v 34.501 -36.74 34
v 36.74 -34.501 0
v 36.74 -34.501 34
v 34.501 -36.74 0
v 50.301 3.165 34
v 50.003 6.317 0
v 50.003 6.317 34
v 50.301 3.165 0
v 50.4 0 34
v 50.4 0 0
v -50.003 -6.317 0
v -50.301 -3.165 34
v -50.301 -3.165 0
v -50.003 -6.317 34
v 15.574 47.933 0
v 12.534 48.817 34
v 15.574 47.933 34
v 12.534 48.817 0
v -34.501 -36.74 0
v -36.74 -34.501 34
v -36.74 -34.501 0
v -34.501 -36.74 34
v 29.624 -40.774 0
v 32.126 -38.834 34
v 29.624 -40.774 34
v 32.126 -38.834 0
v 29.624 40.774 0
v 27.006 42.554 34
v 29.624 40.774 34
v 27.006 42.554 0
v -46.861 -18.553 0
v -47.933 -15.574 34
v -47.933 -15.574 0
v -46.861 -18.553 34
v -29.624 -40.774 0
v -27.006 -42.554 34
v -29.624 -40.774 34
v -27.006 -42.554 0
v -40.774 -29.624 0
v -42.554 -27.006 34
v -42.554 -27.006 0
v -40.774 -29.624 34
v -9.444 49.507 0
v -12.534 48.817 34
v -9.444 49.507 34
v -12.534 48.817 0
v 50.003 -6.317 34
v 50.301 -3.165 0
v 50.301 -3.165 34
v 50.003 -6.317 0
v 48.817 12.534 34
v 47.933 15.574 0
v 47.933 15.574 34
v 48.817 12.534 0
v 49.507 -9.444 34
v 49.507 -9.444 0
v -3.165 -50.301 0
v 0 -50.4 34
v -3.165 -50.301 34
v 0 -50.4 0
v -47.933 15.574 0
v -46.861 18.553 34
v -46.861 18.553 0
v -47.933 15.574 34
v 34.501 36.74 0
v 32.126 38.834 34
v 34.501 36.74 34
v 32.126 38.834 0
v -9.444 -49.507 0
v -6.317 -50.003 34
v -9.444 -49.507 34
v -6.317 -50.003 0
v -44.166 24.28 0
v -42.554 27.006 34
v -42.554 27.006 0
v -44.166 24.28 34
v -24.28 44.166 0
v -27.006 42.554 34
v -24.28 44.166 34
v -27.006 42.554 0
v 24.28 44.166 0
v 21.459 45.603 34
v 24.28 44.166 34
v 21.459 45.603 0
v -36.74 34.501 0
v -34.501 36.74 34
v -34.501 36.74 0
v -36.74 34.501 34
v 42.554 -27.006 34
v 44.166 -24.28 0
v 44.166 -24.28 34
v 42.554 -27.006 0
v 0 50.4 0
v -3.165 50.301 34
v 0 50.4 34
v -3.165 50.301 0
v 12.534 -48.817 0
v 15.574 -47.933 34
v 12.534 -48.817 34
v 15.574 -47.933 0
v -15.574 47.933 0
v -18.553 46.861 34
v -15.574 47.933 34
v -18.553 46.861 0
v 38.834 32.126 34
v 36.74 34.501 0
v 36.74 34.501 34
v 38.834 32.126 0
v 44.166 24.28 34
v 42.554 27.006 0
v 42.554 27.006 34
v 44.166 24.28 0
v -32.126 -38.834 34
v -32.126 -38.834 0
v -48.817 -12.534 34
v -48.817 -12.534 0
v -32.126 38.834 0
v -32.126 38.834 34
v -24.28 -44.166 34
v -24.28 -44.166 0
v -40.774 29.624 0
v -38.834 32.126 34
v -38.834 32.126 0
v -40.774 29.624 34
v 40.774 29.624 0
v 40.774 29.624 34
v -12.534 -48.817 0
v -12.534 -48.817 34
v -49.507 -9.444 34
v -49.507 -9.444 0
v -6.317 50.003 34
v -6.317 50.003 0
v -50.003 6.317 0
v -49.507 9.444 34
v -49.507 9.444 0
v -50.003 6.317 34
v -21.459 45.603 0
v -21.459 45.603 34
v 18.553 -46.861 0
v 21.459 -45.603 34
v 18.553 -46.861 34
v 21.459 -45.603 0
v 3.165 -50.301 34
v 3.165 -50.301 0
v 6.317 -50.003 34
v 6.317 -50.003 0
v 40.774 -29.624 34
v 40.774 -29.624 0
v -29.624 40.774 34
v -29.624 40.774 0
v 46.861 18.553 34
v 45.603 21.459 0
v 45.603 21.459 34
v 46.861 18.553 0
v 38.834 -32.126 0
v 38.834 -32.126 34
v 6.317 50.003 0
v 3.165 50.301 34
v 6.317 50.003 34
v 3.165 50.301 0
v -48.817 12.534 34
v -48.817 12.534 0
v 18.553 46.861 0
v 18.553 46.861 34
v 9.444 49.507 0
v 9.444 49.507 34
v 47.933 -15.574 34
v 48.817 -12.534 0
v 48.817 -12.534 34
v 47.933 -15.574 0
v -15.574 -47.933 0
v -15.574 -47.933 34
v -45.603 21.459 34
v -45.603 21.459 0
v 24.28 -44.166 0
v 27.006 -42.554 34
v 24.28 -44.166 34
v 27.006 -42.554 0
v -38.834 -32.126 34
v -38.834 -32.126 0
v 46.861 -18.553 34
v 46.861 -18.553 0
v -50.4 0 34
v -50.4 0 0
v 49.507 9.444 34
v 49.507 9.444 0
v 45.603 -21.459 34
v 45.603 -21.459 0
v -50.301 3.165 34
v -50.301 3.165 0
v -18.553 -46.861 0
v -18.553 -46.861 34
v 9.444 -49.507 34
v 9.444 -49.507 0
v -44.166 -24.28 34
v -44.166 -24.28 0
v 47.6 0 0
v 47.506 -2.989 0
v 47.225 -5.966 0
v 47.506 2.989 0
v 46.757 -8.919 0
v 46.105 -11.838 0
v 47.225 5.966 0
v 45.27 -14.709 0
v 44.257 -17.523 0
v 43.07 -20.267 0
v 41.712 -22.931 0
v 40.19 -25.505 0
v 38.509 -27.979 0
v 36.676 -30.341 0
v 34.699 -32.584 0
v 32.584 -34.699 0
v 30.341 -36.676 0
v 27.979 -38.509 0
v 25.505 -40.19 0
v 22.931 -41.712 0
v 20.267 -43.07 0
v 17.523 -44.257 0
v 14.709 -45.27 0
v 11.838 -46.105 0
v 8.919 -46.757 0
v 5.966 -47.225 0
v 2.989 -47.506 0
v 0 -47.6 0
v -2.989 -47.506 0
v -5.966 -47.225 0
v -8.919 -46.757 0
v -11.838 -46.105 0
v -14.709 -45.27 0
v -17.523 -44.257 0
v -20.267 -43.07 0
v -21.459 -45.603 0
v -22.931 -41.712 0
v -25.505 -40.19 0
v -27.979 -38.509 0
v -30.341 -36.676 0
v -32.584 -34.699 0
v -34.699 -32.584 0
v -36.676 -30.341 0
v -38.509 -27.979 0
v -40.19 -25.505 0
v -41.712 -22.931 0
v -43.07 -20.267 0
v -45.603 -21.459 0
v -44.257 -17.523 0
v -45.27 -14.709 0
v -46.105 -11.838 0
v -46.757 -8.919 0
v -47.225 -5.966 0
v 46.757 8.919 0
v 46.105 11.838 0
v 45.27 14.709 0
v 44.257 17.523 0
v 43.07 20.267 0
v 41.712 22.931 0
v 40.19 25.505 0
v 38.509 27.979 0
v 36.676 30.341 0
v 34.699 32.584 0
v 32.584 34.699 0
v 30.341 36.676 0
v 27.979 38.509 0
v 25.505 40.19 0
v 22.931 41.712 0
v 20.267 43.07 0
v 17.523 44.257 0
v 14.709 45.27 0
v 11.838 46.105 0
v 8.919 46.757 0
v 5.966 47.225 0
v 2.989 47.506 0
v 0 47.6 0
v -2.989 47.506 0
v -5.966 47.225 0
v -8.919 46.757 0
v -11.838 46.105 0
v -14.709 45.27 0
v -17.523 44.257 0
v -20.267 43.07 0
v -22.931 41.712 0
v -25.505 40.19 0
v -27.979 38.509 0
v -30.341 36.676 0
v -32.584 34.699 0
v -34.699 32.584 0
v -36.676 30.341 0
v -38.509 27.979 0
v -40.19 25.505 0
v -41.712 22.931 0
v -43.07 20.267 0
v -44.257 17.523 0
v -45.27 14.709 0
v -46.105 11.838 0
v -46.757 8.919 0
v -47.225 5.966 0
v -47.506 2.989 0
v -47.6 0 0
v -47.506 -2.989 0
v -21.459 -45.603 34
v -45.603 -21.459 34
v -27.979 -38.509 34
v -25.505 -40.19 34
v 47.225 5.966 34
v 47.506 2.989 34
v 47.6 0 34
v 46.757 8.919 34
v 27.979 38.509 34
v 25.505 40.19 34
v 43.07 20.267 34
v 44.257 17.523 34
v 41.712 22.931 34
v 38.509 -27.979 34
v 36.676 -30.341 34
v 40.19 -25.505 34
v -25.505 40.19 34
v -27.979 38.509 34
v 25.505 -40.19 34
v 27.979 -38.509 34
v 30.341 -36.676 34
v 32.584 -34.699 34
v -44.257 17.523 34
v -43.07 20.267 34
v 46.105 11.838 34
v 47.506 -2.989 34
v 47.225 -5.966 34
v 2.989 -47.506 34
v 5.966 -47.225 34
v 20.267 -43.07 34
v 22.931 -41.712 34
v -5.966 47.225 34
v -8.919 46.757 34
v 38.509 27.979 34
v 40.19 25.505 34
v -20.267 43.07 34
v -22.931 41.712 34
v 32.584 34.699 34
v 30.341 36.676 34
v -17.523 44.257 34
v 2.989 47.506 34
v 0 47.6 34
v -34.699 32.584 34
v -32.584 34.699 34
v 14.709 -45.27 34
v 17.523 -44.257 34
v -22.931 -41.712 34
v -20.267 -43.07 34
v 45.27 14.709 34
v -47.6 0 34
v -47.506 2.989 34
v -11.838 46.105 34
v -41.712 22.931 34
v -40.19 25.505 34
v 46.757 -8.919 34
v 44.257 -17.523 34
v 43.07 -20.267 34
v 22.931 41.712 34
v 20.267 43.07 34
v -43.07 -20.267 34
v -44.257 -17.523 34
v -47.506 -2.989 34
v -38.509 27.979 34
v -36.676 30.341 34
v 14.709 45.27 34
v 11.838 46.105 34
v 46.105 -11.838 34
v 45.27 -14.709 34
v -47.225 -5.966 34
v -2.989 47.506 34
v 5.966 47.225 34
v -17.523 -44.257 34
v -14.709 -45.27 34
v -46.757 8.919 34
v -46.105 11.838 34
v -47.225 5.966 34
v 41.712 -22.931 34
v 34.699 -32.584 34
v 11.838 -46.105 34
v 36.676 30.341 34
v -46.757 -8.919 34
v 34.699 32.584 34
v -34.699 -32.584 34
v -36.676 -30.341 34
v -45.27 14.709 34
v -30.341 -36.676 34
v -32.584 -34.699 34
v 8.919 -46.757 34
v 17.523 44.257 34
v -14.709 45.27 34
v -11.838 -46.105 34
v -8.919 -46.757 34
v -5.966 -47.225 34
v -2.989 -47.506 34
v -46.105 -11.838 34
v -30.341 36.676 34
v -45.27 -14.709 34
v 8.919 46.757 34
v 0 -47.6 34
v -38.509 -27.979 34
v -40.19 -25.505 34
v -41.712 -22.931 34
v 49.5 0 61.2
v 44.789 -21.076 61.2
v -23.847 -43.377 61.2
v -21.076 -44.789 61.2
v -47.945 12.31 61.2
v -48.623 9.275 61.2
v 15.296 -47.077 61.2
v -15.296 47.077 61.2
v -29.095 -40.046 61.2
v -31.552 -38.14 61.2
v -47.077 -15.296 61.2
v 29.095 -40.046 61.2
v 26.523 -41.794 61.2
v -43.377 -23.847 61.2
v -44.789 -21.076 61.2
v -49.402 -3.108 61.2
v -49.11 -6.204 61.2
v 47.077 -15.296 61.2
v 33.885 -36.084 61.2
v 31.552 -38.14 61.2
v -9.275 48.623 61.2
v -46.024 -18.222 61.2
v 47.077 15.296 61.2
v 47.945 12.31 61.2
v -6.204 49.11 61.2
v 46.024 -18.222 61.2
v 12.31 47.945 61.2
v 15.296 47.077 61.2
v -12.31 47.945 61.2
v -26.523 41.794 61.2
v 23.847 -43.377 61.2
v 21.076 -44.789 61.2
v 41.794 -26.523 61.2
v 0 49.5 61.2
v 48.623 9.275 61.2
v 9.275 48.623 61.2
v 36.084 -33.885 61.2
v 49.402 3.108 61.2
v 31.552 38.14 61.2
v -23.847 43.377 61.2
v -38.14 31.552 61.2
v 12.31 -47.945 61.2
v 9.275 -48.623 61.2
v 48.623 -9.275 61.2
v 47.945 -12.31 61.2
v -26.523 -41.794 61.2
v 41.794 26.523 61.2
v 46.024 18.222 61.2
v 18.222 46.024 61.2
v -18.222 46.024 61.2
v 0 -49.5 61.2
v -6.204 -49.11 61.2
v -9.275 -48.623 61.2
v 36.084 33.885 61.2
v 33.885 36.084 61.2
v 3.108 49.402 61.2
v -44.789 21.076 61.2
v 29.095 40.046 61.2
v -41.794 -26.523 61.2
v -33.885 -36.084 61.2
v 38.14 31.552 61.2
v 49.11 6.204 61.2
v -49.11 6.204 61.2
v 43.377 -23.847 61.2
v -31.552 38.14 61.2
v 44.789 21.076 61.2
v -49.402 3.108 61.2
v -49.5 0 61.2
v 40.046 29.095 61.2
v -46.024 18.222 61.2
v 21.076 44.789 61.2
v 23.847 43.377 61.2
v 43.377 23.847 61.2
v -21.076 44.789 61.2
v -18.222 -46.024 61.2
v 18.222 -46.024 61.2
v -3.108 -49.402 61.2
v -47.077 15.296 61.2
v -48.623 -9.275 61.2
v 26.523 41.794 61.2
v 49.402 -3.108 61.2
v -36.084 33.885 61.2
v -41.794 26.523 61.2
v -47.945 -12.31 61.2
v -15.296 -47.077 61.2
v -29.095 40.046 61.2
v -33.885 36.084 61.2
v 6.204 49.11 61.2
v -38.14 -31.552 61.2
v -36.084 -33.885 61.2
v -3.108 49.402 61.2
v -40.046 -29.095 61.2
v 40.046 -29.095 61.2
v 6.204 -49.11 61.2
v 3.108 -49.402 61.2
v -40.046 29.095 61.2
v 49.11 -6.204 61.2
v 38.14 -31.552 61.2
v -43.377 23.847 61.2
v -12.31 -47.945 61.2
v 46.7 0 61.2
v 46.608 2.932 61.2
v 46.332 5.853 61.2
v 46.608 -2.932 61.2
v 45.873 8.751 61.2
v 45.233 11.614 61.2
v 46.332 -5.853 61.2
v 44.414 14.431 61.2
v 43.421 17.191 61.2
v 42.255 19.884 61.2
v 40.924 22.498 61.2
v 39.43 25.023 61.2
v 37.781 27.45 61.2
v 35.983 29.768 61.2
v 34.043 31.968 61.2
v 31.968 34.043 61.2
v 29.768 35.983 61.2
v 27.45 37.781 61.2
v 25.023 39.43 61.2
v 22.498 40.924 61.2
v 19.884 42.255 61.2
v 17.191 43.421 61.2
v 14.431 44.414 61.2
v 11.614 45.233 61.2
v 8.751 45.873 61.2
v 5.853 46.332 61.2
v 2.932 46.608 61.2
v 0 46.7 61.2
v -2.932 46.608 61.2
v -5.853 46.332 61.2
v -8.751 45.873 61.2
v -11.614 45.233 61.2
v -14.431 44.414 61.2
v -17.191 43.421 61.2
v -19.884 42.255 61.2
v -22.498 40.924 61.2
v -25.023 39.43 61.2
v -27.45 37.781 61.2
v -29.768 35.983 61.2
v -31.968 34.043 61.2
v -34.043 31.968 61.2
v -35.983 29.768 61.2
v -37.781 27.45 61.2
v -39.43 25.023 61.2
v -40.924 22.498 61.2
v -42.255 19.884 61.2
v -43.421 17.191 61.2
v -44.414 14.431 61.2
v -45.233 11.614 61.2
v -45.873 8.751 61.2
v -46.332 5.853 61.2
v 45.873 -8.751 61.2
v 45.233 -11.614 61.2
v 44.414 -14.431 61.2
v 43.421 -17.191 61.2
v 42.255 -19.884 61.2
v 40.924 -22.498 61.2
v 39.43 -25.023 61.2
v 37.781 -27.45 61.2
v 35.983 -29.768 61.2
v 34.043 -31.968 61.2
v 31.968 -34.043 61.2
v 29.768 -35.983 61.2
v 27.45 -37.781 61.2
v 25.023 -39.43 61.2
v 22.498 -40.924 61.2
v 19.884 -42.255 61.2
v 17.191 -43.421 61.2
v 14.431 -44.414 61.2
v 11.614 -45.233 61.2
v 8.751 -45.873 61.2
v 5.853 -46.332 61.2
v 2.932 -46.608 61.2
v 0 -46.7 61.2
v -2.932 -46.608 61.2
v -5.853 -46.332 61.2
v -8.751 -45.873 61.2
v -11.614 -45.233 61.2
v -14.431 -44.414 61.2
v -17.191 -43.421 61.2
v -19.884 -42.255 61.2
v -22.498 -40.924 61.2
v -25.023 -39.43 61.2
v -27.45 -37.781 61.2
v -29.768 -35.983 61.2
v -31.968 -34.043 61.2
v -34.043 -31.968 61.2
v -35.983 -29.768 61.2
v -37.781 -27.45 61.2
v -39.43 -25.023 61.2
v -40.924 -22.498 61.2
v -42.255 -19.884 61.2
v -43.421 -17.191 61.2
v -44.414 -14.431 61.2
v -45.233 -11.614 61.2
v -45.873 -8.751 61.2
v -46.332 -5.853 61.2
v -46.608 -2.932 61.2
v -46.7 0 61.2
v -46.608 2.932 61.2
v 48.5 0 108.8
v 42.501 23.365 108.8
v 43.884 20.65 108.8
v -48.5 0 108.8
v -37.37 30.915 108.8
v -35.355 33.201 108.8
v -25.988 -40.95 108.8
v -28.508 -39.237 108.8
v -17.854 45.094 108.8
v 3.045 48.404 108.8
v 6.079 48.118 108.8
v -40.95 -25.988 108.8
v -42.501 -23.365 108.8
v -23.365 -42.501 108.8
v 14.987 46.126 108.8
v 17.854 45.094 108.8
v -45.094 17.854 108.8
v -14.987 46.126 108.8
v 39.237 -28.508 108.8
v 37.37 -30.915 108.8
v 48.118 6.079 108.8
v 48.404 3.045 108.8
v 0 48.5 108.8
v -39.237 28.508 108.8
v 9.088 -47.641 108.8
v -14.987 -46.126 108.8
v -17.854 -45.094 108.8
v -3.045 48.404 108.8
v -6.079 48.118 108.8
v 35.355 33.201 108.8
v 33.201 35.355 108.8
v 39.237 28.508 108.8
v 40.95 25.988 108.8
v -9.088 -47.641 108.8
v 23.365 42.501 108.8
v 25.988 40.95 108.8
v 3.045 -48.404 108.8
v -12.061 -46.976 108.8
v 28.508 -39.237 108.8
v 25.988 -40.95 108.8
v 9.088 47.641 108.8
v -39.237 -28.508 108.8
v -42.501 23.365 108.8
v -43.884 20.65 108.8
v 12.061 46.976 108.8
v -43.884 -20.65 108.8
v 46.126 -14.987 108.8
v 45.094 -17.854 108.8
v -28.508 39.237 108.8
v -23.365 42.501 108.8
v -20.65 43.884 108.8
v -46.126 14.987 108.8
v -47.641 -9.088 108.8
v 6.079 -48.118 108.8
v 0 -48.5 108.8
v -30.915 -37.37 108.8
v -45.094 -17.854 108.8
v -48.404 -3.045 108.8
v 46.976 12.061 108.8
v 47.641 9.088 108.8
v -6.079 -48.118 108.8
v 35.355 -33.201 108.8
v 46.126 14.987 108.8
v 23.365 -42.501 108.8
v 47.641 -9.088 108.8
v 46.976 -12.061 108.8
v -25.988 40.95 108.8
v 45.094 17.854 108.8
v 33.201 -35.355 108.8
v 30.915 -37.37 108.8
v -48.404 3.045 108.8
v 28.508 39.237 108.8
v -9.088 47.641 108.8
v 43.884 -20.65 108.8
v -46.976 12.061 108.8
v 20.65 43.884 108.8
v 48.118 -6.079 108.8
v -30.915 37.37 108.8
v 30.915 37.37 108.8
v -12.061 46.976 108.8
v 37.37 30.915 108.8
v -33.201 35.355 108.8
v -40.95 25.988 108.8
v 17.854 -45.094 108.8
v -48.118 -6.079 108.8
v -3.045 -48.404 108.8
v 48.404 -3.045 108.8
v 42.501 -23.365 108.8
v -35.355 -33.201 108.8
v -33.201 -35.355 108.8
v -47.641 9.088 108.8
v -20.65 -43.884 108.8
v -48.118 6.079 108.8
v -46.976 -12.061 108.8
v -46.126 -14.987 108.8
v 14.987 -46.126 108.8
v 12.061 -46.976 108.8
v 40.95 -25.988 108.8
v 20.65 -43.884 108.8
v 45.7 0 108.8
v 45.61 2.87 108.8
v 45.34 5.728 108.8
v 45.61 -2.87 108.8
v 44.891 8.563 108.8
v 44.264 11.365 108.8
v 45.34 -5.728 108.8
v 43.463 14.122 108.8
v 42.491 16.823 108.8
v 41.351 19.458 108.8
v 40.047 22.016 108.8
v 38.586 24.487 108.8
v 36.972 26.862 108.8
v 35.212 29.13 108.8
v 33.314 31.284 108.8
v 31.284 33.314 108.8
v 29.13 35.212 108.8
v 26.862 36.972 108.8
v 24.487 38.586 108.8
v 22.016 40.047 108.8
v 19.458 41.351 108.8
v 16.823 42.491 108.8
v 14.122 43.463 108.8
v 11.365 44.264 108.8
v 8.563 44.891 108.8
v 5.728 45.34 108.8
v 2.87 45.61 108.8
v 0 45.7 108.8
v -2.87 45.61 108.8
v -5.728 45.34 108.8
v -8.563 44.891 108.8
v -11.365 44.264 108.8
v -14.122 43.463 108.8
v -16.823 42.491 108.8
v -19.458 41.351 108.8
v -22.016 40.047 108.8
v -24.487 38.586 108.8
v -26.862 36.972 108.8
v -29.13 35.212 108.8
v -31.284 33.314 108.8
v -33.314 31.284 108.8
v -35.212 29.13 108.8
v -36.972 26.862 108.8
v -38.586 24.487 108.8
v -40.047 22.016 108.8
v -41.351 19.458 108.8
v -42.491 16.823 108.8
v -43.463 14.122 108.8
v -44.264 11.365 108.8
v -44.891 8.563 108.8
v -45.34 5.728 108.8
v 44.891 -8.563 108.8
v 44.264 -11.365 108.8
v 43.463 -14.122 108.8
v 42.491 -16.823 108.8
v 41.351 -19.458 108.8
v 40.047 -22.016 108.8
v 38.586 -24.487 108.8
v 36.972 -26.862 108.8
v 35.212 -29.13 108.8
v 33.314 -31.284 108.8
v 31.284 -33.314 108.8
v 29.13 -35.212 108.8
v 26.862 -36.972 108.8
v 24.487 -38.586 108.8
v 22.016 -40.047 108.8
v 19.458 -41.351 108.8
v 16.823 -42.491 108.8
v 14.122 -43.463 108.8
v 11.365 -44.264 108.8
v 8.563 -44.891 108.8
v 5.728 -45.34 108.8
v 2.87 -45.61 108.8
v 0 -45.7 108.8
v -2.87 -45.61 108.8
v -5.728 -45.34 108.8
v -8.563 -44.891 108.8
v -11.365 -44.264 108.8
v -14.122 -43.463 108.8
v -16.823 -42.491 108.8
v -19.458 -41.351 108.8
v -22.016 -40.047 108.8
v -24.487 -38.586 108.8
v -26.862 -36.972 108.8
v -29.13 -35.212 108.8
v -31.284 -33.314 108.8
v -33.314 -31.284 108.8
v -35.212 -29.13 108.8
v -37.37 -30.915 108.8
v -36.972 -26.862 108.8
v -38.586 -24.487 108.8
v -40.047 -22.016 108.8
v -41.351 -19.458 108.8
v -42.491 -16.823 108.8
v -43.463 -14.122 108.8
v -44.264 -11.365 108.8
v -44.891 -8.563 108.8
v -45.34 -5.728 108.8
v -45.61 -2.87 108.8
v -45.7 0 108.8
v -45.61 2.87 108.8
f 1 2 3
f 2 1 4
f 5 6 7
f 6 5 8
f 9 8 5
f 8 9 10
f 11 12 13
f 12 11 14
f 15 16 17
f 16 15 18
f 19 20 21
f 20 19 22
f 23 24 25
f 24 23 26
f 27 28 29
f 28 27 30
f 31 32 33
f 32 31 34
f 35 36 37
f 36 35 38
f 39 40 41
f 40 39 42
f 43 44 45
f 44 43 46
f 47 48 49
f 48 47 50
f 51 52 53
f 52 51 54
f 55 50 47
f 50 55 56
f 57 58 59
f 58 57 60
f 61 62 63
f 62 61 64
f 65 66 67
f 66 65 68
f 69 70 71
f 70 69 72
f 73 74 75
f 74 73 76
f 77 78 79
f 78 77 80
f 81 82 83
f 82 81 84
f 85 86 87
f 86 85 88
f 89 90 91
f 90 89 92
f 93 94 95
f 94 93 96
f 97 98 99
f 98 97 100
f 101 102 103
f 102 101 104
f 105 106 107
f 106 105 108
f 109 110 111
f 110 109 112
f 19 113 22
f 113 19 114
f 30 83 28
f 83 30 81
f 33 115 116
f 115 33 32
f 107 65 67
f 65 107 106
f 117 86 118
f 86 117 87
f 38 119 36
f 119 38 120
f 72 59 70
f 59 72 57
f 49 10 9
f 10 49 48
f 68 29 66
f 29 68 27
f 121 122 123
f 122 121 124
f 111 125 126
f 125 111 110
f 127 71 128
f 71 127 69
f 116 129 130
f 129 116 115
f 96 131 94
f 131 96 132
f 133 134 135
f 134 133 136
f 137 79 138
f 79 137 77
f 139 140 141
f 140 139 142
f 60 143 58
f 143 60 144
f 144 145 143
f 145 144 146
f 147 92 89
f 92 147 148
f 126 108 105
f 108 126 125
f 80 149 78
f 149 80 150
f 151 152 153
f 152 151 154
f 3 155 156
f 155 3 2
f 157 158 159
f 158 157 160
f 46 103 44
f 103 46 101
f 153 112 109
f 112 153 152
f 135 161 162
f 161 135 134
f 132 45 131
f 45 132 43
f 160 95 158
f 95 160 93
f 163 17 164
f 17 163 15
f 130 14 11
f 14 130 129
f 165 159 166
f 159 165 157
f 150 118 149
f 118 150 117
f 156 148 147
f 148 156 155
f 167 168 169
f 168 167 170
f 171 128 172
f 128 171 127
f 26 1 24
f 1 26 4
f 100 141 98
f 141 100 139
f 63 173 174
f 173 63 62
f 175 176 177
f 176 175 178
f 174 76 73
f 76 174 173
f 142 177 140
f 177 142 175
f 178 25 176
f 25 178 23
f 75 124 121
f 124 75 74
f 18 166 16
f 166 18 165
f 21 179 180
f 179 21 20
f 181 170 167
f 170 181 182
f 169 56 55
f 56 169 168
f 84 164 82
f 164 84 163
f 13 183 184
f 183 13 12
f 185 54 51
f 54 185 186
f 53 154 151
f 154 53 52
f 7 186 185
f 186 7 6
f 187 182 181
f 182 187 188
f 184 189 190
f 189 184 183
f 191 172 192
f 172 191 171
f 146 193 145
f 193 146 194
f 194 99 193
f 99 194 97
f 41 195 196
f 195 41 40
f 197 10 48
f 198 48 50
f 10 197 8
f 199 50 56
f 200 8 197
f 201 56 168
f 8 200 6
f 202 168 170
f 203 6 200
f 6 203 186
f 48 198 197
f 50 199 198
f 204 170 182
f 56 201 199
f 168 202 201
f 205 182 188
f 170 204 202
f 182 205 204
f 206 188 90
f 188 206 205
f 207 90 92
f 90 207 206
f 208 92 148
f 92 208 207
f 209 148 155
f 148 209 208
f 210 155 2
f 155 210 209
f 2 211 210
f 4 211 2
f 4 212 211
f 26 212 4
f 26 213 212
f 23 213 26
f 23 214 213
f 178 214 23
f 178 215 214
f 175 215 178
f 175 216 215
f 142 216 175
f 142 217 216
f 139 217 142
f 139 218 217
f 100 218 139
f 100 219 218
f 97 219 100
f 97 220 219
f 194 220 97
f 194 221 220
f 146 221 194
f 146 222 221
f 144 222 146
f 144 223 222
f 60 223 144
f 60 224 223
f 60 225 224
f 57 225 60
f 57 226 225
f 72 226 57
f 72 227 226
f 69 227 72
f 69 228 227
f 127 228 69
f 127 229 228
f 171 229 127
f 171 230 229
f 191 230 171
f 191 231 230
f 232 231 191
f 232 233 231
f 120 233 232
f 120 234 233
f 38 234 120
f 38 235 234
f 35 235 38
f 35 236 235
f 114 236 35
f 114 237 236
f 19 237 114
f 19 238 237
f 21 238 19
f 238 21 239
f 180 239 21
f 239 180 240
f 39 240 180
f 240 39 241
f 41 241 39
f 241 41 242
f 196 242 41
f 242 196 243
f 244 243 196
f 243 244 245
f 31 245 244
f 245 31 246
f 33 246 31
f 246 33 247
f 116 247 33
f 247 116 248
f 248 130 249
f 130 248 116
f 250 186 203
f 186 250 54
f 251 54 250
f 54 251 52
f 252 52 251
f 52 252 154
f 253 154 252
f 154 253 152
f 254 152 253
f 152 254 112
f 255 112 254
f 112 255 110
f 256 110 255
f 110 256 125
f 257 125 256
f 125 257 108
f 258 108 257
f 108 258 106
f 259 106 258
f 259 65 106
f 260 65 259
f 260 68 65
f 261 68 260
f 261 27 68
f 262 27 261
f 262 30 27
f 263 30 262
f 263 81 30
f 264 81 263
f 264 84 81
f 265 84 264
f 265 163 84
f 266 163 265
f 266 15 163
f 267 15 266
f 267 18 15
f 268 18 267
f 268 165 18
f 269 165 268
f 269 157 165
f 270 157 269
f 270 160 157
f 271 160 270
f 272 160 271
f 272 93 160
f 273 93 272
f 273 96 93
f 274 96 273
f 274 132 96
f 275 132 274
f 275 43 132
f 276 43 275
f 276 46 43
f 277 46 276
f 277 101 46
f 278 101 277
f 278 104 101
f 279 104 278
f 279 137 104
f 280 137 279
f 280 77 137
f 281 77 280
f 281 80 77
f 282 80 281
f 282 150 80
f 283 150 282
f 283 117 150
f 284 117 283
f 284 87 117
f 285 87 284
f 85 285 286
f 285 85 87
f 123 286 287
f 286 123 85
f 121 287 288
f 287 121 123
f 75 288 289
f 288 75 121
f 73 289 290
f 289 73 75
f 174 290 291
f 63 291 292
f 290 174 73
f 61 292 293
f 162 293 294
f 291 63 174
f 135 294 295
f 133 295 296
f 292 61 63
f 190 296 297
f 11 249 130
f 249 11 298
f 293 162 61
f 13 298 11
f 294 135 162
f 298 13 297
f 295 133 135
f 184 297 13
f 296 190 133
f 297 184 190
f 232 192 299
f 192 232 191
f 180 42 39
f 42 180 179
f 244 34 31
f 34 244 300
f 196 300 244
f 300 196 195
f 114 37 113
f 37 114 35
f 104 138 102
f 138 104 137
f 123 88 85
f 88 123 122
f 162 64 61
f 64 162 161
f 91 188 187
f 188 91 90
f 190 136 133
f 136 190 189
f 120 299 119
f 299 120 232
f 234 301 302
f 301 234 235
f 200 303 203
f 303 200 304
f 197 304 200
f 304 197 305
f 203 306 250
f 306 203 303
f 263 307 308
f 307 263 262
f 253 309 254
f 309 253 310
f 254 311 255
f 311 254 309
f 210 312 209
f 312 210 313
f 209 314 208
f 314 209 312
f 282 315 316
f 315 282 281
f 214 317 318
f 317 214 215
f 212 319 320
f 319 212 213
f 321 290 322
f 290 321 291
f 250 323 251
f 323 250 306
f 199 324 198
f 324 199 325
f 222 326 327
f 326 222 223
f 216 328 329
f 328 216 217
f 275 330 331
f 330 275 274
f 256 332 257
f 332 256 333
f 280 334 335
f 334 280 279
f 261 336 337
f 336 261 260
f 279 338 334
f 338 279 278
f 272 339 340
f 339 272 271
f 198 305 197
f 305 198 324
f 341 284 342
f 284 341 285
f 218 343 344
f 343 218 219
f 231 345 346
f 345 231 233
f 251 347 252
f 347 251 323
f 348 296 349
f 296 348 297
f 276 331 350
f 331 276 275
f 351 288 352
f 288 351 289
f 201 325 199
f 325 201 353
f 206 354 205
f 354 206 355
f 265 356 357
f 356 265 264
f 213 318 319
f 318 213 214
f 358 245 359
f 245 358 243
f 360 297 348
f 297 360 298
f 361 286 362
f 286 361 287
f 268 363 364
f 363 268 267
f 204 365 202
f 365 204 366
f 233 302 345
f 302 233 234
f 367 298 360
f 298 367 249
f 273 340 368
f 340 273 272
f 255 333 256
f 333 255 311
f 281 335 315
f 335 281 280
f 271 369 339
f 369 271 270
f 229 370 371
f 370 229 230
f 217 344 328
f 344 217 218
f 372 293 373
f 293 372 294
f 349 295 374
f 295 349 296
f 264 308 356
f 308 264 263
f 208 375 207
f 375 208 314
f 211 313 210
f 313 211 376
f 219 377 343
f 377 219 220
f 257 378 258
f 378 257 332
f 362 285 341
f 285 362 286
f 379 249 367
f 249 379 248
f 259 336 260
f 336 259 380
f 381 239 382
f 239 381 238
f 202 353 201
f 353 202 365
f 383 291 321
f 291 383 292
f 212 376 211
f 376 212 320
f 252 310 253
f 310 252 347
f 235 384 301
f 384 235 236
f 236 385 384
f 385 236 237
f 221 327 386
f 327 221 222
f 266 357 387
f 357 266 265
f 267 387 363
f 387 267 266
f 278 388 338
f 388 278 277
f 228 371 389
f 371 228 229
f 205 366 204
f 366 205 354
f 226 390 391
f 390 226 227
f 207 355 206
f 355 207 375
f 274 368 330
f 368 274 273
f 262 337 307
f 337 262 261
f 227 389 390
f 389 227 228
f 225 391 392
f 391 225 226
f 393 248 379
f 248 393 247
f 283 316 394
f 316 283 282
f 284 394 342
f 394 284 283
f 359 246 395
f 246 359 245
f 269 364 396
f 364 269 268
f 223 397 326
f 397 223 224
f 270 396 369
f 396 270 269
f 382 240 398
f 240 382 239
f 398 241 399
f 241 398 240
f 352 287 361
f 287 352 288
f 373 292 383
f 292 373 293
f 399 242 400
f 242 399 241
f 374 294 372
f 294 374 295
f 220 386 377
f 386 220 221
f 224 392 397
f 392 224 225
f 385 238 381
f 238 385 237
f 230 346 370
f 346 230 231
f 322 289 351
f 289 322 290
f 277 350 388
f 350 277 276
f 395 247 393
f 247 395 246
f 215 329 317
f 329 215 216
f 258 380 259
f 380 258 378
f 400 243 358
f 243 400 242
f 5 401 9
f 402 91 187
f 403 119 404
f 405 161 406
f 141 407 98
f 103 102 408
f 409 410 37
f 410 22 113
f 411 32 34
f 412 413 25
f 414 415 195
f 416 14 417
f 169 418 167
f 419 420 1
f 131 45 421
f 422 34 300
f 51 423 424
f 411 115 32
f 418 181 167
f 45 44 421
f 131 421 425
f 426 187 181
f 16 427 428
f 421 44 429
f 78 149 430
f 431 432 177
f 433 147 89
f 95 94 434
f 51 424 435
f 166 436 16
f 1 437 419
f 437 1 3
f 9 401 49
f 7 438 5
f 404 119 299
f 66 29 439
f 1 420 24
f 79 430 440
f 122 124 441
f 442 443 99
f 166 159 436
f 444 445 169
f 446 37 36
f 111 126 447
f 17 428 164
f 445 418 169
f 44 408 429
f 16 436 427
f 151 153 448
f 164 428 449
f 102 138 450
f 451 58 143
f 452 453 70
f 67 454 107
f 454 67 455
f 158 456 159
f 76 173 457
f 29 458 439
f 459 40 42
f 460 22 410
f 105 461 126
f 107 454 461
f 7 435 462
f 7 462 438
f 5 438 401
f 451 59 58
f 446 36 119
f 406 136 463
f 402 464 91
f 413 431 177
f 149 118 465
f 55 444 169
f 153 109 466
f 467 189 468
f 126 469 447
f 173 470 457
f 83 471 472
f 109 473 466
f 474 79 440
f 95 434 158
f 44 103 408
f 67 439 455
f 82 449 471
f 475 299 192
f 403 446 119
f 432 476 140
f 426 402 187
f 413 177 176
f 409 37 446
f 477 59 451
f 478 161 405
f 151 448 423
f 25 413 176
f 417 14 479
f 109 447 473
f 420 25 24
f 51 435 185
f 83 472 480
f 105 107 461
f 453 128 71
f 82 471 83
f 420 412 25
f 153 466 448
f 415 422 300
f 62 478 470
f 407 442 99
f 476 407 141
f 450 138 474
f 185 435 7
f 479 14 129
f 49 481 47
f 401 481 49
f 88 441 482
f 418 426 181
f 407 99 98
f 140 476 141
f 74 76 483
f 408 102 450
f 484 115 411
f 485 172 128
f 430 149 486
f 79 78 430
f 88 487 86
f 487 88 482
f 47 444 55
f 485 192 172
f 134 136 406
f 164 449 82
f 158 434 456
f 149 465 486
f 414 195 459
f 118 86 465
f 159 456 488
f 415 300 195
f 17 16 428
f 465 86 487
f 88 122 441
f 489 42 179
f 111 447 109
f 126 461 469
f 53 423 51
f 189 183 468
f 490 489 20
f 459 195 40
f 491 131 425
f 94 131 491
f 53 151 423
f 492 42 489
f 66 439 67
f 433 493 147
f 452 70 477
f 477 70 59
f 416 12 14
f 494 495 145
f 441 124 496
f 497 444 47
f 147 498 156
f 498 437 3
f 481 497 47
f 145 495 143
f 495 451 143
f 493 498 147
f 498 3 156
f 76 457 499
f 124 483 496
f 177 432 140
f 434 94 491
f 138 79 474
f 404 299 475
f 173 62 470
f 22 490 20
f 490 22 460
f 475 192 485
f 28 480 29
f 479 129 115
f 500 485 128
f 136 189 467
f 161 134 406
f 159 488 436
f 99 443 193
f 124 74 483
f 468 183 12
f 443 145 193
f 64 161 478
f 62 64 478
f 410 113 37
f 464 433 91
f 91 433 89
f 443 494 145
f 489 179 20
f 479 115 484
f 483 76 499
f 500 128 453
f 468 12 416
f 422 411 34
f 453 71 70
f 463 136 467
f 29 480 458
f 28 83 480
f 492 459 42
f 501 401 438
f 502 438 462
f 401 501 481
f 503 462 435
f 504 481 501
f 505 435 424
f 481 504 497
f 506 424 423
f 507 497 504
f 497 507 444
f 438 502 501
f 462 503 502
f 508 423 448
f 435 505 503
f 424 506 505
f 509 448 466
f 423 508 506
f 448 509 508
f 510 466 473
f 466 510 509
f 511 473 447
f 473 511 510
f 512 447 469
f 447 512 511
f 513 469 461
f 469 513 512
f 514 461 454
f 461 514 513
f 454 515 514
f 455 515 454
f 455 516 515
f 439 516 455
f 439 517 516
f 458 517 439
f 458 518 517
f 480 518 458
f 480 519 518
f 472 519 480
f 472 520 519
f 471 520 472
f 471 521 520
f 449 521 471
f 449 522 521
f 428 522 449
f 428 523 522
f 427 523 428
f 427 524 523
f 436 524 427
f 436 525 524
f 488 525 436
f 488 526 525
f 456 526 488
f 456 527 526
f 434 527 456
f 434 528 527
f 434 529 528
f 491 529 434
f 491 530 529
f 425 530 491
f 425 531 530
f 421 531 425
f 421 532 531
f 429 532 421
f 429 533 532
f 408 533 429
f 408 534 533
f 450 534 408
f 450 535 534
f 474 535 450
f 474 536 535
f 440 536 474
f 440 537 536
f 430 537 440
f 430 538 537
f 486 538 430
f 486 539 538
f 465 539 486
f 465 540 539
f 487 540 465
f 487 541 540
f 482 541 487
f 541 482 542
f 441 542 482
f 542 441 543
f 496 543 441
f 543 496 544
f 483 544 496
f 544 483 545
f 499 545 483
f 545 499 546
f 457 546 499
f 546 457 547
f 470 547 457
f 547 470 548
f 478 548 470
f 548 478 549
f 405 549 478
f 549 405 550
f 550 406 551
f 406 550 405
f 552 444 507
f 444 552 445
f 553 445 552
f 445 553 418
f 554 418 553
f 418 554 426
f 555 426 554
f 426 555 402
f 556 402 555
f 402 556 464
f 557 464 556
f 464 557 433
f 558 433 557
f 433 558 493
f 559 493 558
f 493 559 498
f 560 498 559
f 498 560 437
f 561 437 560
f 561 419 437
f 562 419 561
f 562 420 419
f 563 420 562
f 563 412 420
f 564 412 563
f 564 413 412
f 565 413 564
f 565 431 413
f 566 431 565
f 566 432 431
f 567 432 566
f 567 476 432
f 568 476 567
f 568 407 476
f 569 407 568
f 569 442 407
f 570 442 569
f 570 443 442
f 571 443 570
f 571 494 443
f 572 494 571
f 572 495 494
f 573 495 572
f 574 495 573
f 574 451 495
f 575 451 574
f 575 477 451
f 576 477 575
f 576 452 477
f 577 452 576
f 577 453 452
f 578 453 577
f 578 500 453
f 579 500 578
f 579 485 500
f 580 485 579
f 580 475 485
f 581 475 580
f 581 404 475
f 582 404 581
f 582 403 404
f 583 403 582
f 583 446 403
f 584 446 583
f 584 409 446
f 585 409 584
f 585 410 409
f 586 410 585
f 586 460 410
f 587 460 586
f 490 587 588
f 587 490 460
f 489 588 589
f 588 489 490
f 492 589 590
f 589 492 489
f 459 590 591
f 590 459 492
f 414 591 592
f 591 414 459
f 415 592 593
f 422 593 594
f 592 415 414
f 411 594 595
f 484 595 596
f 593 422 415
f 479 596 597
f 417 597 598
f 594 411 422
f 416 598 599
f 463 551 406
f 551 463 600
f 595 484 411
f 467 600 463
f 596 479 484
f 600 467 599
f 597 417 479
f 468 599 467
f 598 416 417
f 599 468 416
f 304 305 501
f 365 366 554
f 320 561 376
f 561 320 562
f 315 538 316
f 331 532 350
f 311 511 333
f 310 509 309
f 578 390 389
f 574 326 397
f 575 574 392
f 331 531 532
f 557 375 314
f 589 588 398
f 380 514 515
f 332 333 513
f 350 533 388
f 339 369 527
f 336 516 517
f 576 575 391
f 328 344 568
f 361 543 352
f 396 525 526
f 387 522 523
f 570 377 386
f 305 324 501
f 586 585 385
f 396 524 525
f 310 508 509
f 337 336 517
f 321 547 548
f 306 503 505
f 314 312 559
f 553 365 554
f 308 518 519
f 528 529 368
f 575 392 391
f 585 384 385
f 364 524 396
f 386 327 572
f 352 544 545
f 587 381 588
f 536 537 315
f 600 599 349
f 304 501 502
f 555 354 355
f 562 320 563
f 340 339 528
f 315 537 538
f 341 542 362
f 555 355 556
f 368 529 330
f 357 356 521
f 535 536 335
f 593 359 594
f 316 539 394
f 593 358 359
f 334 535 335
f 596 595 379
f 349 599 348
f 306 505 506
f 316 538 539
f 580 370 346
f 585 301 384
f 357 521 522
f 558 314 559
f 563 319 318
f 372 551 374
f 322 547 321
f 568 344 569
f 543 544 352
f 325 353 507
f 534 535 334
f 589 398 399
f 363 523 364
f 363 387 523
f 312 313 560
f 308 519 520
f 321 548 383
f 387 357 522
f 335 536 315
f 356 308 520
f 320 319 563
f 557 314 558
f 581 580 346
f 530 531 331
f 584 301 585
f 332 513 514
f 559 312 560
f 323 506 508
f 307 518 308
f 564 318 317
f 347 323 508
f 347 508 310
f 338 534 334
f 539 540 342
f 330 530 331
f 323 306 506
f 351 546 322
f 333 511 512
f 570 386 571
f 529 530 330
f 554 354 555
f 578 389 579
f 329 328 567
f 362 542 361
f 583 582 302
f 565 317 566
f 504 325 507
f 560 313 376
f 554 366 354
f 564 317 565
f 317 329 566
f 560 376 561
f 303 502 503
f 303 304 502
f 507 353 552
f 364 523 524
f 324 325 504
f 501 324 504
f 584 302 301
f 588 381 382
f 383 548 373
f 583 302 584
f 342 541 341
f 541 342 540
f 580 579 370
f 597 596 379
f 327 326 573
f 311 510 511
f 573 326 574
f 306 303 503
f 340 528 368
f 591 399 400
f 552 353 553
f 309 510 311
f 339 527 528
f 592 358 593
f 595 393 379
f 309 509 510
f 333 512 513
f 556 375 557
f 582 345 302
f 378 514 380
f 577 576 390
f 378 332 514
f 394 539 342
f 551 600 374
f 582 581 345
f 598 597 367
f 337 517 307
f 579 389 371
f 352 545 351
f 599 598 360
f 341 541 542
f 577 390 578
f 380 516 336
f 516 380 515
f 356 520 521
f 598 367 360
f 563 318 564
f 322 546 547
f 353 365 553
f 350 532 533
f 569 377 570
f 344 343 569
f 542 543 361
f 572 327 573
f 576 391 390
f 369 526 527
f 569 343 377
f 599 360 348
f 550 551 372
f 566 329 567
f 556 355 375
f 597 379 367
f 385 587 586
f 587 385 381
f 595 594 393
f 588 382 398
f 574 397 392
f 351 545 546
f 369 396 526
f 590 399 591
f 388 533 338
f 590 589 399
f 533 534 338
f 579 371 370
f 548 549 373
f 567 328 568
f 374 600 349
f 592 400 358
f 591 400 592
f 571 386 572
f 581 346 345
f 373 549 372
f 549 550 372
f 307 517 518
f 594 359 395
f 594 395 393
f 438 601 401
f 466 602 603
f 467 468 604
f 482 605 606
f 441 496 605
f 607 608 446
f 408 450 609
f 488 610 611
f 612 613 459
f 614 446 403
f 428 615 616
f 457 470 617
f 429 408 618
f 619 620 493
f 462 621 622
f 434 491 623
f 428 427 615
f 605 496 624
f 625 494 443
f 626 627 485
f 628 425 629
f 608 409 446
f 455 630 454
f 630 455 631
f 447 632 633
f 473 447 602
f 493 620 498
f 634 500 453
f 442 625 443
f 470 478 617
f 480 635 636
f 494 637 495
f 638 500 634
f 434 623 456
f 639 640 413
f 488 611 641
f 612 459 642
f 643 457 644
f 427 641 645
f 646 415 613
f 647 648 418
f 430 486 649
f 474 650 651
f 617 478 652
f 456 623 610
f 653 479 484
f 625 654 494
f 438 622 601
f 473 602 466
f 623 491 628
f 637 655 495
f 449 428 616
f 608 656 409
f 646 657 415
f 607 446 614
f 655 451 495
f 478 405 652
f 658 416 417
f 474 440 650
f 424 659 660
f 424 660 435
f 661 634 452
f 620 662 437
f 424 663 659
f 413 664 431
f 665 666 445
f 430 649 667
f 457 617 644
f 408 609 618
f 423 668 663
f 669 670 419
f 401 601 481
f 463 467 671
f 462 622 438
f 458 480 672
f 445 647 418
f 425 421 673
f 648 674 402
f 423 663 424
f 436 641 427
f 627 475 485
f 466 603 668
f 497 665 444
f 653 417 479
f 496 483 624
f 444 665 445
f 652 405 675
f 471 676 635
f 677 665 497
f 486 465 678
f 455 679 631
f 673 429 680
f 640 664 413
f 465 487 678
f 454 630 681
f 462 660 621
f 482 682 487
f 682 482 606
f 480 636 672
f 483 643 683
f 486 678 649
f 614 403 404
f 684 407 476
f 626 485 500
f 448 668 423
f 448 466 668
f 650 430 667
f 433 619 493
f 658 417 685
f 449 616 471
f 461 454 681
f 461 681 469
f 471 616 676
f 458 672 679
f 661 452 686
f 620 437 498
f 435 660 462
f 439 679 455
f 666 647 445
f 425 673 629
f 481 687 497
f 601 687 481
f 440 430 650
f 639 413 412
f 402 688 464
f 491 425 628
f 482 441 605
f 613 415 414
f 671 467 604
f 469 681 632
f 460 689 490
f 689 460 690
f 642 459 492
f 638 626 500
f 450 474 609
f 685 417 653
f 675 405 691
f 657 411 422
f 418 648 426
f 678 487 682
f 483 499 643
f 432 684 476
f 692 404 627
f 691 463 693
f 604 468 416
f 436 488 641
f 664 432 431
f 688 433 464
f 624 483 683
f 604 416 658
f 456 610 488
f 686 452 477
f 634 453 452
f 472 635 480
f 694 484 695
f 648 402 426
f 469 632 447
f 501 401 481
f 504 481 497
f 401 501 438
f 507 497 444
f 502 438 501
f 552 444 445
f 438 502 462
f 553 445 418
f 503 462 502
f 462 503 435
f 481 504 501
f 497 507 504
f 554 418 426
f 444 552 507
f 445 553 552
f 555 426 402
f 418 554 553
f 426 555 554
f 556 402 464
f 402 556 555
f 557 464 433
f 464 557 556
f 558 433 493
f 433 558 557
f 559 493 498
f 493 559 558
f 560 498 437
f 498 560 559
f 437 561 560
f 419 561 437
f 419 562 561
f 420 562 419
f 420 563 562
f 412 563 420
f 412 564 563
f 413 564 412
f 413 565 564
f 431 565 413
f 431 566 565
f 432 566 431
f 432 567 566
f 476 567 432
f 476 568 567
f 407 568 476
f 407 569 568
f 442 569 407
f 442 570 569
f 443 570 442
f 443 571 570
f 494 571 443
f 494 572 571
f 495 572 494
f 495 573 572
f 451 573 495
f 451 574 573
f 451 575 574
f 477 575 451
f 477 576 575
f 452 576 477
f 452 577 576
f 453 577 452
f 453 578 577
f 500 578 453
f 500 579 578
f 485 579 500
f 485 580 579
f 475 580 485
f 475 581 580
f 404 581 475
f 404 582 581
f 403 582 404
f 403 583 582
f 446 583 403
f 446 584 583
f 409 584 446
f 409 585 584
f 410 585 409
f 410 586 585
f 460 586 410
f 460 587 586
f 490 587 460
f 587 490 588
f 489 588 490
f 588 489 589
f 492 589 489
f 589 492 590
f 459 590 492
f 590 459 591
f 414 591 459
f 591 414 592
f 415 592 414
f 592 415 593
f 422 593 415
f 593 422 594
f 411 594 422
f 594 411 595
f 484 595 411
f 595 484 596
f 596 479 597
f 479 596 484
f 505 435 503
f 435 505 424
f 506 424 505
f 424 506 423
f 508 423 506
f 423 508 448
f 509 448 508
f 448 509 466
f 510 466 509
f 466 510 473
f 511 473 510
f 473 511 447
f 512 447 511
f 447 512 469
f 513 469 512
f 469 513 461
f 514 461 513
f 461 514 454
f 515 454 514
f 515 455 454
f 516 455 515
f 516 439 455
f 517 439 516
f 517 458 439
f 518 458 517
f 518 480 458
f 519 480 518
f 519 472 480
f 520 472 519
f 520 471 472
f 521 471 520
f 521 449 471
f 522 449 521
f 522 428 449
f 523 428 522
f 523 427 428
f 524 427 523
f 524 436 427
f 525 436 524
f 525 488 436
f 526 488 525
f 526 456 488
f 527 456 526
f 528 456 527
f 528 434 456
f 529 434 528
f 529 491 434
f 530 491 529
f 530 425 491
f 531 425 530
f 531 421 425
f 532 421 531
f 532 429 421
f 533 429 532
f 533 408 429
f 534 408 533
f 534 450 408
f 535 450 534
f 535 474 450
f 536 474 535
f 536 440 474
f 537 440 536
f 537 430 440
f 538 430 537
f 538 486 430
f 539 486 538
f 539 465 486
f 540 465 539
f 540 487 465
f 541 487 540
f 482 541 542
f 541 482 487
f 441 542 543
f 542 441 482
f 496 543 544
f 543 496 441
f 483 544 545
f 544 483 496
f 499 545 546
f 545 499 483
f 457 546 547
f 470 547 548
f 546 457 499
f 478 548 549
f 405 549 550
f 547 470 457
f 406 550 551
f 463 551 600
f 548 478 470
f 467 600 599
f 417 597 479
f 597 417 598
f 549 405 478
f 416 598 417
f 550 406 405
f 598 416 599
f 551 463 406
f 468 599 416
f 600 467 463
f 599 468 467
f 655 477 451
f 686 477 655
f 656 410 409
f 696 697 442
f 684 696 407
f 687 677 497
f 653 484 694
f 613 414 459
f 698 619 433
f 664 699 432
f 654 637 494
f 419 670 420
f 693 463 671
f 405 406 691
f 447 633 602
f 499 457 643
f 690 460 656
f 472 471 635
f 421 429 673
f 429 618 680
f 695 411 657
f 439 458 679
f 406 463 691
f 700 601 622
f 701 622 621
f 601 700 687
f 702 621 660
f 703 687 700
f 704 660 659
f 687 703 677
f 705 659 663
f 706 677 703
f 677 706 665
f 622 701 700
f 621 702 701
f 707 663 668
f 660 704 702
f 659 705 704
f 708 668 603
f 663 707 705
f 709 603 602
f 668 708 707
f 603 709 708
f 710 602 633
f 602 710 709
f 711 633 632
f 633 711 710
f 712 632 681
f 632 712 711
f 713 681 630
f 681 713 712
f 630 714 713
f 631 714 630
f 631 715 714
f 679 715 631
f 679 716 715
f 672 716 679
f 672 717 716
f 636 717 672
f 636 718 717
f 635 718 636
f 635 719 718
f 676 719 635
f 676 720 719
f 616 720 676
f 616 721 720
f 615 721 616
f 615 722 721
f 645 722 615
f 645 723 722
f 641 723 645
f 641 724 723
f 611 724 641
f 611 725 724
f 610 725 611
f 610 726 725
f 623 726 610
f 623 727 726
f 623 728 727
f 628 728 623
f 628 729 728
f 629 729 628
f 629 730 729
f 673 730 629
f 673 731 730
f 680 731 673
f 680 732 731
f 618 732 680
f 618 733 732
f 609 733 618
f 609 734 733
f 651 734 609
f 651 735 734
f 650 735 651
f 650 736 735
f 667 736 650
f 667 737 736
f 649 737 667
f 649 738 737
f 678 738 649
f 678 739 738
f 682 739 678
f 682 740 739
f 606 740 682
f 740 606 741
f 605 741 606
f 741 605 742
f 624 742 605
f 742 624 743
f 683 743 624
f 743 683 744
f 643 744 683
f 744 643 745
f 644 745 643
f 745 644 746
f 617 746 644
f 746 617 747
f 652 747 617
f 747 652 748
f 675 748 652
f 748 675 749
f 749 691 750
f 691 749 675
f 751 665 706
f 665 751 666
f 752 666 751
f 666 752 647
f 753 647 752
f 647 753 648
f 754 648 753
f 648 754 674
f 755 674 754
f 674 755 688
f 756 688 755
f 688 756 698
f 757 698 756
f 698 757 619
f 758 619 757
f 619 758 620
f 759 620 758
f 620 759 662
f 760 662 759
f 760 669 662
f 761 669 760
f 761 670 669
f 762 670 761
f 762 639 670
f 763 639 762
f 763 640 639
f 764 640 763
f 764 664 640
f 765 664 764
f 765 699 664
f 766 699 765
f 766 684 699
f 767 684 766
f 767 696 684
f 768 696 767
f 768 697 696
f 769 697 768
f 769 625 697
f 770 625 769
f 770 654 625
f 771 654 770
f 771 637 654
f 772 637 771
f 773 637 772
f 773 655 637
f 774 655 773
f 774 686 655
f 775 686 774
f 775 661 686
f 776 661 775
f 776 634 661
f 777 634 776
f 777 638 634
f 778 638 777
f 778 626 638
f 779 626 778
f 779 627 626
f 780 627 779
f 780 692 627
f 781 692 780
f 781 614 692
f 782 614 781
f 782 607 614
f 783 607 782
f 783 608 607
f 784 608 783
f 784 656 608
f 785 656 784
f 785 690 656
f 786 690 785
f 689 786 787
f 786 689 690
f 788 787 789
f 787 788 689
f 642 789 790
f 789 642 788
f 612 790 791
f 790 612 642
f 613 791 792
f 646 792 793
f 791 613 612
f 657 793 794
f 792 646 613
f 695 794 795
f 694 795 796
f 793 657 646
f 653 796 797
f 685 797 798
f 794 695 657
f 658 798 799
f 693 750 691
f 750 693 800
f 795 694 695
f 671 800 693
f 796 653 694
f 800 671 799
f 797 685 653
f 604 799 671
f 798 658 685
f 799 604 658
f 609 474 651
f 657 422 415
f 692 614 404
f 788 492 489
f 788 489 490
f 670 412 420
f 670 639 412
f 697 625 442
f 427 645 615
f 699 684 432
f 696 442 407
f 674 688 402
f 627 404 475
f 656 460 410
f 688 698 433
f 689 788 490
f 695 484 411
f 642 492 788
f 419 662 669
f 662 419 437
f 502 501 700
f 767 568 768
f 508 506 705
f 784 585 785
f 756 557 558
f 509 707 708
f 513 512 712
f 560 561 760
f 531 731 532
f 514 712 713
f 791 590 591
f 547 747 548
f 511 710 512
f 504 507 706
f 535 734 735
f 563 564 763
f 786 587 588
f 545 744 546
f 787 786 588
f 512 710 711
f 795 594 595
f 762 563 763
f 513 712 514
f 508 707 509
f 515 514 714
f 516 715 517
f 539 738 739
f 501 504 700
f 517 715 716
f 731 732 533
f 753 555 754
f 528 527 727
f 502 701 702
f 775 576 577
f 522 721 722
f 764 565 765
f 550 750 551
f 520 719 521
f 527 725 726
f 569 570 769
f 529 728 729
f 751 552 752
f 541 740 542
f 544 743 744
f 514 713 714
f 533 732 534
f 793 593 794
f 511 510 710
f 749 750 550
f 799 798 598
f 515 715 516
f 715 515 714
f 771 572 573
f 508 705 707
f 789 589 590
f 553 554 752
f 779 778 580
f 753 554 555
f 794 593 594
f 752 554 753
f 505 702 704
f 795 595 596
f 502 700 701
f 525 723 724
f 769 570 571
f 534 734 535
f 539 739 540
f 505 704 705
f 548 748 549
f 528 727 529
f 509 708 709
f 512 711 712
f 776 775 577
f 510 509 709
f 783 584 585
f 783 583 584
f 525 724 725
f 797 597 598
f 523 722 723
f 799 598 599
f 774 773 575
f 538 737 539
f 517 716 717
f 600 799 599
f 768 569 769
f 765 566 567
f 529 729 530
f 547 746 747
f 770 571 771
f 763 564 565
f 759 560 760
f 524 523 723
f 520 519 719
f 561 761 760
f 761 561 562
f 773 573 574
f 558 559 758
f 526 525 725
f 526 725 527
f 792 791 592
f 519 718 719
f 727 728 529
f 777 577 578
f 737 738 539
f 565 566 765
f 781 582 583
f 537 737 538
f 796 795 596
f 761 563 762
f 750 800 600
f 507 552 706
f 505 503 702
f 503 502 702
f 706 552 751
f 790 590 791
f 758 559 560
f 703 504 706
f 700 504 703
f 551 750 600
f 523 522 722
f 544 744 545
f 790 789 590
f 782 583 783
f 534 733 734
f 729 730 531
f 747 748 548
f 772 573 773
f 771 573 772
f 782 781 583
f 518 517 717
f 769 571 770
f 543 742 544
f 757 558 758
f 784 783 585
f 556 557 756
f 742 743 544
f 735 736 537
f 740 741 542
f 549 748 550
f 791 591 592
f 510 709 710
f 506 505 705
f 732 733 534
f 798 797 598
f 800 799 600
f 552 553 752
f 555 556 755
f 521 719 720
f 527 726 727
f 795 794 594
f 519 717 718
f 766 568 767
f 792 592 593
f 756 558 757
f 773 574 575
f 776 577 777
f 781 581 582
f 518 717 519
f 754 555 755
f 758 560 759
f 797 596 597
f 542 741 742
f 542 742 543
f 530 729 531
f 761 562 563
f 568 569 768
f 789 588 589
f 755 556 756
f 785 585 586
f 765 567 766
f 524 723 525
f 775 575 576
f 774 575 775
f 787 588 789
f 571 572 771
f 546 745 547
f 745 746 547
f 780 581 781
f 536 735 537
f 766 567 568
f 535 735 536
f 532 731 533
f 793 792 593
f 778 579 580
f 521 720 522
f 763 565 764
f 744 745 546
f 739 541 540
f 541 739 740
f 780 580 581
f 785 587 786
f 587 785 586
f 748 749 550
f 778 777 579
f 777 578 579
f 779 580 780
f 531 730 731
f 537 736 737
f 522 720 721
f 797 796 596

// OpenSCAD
$fn=100;
wall_thickness = 2.8;
section_length = 34;
end_taper = 2.0;
middle_shrink = 0.8;
end_scale = 1.4;

start_int_dia = 95.2;
start_ext_dia = start_int_dia + 2 * wall_thickness;

end_ext_dia = 99.0;
end_int_dia = end_ext_dia - 2 * wall_thickness;


module start_tube() {
    difference() {
        cylinder(section_length, d = start_ext_dia);
        cylinder(section_length, d = start_int_dia);
    }
}

module middle_tube() {
    difference() {
        cylinder(section_length * middle_shrink, d1 = start_ext_dia, d2 = end_ext_dia);
        cylinder(section_length * middle_shrink, d1 = start_int_dia, d2 = end_int_dia);
    }
}

module end_tube() {
    difference() {
        cylinder(section_length*end_scale, d1 = end_ext_dia, d2 = end_ext_dia-end_taper);
        cylinder(section_length*end_scale, d1 = end_int_dia, d2 = end_int_dia-end_taper);
    }
}

module adaptor() {
    start_tube();
    translate([0, 0, section_length]) middle_tube();
    translate([0, 0, section_length*(1+middle_shrink)]) end_tube();    
}


adaptor();
    
    
